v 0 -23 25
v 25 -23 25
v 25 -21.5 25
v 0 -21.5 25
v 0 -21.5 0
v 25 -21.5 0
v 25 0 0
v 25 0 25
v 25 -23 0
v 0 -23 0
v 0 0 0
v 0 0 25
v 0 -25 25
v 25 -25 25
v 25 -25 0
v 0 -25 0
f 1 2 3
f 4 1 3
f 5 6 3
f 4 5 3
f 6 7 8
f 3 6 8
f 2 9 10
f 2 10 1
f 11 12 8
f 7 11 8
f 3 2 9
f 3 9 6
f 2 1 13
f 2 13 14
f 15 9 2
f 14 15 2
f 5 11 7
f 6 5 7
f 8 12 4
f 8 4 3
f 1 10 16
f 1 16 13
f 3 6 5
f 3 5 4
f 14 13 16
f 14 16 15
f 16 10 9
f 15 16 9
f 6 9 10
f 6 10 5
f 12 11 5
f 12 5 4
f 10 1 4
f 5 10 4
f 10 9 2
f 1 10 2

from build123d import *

# Parameters (mm, degrees)
F0_W     = 25
F0_H     = 25
F1_DEPTH = 25
F2_W     = 1.5
F2_H     = 25
F3_DEPTH = 25
F4_DEPTH = 25


with BuildPart() as f1:
    # F0 (on Front) → F1 (new body)
    with BuildSketch(Plane.XZ):
        with Locations((12.5, 12.5)):
            Rectangle(F0_W, F0_H)
    extrude(amount=F1_DEPTH)

    # F2 (on face) → F3 (cut)
    with BuildSketch(Plane.YZ.offset(25)):
        with Locations((-22.25, 12.5)):
            Rectangle(F2_W, F2_H)
    extrude(amount=-F3_DEPTH, mode=Mode.SUBTRACT)


with BuildPart() as f4:
    # F2 (on face) → F4 (new body)
    with BuildSketch(Plane.YZ.offset(25)):
        with Locations((-22.25, 12.5)):
            Rectangle(F2_W, F2_H)
    extrude(amount=-F4_DEPTH)


solid = Compound([f1.part, f4.part])
